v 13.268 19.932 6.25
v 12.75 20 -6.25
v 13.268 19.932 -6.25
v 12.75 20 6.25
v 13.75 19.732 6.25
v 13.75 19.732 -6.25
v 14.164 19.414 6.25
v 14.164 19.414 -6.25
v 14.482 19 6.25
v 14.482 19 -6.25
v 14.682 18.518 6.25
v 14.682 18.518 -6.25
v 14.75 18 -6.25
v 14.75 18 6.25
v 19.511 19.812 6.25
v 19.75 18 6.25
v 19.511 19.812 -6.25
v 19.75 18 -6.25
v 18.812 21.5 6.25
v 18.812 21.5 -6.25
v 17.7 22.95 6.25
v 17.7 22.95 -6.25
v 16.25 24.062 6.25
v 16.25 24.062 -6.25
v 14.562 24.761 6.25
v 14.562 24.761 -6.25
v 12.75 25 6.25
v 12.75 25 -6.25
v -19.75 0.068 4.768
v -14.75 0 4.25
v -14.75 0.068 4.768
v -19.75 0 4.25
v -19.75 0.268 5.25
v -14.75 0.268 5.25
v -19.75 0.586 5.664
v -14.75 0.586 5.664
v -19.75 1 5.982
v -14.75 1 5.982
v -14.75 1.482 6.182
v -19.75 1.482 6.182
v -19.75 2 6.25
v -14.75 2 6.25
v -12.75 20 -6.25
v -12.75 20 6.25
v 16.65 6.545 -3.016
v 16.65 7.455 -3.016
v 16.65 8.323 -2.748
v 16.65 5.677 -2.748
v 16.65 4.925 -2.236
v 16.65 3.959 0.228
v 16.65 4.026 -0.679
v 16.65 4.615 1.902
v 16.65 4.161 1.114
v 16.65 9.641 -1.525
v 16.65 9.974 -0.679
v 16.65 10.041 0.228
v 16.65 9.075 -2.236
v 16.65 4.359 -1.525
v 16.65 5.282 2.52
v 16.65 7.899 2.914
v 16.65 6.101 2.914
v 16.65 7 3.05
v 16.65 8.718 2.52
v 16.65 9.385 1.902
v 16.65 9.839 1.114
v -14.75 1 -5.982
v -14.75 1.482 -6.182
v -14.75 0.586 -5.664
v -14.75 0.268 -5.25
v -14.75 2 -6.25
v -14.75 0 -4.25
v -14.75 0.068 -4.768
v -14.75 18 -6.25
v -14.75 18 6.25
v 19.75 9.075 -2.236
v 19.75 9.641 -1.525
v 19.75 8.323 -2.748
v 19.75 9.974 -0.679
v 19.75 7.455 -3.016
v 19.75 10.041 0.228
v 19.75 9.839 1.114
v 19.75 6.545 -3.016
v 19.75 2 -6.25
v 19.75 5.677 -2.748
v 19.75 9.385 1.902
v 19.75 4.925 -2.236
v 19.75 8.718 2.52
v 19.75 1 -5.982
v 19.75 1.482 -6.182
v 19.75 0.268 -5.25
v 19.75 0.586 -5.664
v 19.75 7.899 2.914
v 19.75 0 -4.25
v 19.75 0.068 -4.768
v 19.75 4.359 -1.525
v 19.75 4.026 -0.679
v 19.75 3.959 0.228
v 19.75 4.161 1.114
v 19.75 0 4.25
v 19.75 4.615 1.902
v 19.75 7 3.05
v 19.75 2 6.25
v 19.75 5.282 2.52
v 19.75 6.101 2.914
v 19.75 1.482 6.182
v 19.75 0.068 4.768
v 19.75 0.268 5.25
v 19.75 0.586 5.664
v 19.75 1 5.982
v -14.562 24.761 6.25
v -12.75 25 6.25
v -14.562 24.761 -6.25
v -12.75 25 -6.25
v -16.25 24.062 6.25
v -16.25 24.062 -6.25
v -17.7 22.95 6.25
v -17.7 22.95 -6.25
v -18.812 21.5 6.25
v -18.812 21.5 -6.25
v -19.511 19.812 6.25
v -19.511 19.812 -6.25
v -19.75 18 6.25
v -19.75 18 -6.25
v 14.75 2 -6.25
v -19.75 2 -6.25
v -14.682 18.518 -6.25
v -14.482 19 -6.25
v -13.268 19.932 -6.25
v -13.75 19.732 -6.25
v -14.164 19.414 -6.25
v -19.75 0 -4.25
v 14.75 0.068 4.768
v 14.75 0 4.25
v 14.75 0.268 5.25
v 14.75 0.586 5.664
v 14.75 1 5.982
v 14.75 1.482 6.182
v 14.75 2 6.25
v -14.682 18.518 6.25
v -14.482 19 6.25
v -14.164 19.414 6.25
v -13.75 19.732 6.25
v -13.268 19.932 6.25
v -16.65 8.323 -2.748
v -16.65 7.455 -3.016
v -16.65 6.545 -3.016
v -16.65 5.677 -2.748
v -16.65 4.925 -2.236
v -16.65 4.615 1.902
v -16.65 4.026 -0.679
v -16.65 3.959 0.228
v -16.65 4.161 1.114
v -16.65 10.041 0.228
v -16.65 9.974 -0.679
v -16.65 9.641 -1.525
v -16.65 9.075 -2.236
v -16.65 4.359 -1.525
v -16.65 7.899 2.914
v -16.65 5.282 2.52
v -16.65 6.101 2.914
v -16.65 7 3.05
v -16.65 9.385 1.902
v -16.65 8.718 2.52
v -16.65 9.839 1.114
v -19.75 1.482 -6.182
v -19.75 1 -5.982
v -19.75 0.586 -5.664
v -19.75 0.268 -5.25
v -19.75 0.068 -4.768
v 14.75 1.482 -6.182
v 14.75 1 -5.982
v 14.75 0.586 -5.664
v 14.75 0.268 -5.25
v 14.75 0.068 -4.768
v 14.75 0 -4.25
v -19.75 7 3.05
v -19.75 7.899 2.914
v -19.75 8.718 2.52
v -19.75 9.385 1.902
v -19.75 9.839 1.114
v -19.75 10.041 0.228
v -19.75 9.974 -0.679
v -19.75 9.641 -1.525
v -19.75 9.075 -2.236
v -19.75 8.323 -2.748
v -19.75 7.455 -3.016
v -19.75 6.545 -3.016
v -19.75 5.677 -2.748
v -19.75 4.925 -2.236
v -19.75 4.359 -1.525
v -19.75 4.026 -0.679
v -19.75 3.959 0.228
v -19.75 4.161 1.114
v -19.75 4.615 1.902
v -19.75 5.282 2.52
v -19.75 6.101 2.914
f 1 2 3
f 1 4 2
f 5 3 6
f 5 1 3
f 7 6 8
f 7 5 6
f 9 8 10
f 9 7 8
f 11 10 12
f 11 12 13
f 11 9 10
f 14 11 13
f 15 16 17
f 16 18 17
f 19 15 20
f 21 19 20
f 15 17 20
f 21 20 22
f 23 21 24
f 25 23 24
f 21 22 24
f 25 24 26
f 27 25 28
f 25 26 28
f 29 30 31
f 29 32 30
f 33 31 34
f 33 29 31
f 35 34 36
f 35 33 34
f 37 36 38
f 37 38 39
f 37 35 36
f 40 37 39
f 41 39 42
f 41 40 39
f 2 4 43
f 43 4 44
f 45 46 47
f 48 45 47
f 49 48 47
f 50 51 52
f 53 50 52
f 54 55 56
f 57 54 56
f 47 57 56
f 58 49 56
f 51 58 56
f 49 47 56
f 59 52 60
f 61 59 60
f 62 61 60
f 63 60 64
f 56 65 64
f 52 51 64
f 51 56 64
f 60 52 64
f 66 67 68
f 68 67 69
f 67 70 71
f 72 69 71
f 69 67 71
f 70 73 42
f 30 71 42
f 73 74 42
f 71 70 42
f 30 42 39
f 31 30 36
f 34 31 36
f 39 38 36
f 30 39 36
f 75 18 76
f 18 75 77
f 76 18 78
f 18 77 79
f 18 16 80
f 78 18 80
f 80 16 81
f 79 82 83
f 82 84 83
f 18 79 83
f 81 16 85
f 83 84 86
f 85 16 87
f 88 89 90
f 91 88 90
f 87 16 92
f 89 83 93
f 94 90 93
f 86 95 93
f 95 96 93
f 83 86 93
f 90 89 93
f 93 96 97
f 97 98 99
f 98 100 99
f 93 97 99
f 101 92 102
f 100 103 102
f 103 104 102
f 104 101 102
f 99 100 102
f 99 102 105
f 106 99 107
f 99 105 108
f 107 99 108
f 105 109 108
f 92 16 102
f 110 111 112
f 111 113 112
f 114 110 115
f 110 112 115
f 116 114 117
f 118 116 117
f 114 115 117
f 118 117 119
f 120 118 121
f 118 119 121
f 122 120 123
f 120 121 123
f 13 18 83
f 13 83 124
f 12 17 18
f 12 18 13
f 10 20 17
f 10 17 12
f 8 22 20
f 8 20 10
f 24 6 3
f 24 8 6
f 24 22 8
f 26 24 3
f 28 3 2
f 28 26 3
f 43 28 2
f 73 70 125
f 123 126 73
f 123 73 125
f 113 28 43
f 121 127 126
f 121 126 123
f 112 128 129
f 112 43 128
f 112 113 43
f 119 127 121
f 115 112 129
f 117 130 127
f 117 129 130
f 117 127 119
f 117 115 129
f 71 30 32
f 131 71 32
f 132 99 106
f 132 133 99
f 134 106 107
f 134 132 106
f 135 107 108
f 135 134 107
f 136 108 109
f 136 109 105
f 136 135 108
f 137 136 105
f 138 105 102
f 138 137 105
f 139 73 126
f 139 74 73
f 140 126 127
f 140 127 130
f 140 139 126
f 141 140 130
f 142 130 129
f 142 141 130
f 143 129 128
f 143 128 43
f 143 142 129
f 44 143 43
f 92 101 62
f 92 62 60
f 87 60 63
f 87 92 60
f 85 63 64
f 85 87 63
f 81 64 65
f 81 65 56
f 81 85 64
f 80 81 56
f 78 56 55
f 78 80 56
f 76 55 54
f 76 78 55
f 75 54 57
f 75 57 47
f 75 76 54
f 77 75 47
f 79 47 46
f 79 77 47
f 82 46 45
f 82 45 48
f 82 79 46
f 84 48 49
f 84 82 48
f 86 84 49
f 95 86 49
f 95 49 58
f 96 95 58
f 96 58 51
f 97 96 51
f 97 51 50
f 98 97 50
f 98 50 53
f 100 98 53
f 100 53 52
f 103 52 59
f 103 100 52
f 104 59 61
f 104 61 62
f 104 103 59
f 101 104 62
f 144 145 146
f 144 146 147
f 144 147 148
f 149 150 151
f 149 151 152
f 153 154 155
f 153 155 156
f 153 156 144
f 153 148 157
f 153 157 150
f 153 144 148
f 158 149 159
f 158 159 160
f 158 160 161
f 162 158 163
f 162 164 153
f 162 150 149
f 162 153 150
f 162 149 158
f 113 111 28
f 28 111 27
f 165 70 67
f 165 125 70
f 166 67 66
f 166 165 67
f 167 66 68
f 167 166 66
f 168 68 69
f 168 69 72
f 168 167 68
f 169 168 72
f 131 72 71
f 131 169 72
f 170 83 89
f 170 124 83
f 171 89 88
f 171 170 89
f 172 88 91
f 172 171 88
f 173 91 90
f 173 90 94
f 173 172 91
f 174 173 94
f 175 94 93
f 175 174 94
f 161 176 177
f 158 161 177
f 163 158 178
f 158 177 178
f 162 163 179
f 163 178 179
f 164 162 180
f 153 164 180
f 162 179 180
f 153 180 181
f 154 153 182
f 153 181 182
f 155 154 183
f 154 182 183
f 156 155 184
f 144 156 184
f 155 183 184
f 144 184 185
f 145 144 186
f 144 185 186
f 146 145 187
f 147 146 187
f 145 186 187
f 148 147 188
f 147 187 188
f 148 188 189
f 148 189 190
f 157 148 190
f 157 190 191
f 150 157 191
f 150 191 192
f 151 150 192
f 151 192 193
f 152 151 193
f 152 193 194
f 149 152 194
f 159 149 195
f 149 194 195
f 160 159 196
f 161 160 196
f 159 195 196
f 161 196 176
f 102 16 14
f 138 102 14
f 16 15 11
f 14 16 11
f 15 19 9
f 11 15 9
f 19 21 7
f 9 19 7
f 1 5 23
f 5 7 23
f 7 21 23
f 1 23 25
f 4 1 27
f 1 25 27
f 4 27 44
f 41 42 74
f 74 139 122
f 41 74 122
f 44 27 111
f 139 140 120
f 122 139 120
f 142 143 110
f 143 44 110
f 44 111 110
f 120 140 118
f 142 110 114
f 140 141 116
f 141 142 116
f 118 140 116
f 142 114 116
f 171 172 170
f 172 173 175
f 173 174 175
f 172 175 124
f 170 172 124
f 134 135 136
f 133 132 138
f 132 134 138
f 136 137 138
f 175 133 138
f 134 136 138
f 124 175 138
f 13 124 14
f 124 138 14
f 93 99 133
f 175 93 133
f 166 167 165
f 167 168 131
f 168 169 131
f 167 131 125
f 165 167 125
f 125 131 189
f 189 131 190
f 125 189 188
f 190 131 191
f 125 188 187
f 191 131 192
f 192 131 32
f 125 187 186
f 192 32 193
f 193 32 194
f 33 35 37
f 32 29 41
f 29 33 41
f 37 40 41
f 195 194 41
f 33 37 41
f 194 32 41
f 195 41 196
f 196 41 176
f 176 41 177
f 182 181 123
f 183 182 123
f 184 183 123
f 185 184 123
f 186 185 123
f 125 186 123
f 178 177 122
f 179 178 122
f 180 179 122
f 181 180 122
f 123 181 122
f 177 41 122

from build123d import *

# Parameters (mm, degrees)
BOSS_EXTRUDE1_DEPTH = 6.25
SKETCH2_R           = 3.05
CUT_EXTRUDE1_DEPTH  = 3.1
FILLET1_R           = 2
FILLET2_R           = 7
FILLET3_R           = 2


with BuildPart() as part:
    # Sketch1 → Boss-Extrude1 (new body, symmetric)
    with BuildSketch(Plane.XY):
        Polygon((-14.75, 0), (-19.75, 0), (-19.75, 25), (19.75, 25), (19.75, 0), (14.75, 0), (14.75, 20), (-14.75, 20), align=None)
    extrude(amount=BOSS_EXTRUDE1_DEPTH, both=True)

    # Sketch2 → Cut-Extrude1 (cut)
    with BuildSketch(Plane.ZY.offset(19.75)):
        with Locations((0, 7)):
            Circle(SKETCH2_R)
    cut_extrude1 = extrude(amount=-CUT_EXTRUDE1_DEPTH, mode=Mode.SUBTRACT)

    # Mirror1: Cut-Extrude1 across plane
    add(cut_extrude1.mirror(Plane(origin=(0, 0, 0), x_dir=(0, 0, 1), z_dir=(1, 0, 0))), mode=Mode.SUBTRACT)

    # Fillet1
    fillet1_edges = [part.edges().sort_by_distance(p)[0] for p in [
        (14.75, 20, 0),
        (-14.75, 20, 0),
    ]]
    fillet(fillet1_edges, radius=FILLET1_R)

    # Fillet2
    fillet2_edges = [part.edges().sort_by_distance(p)[0] for p in [
        (-19.75, 25, 0),
        (19.75, 25, 0),
    ]]
    fillet(fillet2_edges, radius=FILLET2_R)

    # Fillet3
    fillet3_edges = [part.edges().sort_by_distance(p)[0] for p in [
        (17.25, 0, -6.25),
        (17.25, 0, 6.25),
        (-17.25, 0, 6.25),
        (-17.25, 0, -6.25),
    ]]
    fillet(fillet3_edges, radius=FILLET3_R)


solid = part.part
